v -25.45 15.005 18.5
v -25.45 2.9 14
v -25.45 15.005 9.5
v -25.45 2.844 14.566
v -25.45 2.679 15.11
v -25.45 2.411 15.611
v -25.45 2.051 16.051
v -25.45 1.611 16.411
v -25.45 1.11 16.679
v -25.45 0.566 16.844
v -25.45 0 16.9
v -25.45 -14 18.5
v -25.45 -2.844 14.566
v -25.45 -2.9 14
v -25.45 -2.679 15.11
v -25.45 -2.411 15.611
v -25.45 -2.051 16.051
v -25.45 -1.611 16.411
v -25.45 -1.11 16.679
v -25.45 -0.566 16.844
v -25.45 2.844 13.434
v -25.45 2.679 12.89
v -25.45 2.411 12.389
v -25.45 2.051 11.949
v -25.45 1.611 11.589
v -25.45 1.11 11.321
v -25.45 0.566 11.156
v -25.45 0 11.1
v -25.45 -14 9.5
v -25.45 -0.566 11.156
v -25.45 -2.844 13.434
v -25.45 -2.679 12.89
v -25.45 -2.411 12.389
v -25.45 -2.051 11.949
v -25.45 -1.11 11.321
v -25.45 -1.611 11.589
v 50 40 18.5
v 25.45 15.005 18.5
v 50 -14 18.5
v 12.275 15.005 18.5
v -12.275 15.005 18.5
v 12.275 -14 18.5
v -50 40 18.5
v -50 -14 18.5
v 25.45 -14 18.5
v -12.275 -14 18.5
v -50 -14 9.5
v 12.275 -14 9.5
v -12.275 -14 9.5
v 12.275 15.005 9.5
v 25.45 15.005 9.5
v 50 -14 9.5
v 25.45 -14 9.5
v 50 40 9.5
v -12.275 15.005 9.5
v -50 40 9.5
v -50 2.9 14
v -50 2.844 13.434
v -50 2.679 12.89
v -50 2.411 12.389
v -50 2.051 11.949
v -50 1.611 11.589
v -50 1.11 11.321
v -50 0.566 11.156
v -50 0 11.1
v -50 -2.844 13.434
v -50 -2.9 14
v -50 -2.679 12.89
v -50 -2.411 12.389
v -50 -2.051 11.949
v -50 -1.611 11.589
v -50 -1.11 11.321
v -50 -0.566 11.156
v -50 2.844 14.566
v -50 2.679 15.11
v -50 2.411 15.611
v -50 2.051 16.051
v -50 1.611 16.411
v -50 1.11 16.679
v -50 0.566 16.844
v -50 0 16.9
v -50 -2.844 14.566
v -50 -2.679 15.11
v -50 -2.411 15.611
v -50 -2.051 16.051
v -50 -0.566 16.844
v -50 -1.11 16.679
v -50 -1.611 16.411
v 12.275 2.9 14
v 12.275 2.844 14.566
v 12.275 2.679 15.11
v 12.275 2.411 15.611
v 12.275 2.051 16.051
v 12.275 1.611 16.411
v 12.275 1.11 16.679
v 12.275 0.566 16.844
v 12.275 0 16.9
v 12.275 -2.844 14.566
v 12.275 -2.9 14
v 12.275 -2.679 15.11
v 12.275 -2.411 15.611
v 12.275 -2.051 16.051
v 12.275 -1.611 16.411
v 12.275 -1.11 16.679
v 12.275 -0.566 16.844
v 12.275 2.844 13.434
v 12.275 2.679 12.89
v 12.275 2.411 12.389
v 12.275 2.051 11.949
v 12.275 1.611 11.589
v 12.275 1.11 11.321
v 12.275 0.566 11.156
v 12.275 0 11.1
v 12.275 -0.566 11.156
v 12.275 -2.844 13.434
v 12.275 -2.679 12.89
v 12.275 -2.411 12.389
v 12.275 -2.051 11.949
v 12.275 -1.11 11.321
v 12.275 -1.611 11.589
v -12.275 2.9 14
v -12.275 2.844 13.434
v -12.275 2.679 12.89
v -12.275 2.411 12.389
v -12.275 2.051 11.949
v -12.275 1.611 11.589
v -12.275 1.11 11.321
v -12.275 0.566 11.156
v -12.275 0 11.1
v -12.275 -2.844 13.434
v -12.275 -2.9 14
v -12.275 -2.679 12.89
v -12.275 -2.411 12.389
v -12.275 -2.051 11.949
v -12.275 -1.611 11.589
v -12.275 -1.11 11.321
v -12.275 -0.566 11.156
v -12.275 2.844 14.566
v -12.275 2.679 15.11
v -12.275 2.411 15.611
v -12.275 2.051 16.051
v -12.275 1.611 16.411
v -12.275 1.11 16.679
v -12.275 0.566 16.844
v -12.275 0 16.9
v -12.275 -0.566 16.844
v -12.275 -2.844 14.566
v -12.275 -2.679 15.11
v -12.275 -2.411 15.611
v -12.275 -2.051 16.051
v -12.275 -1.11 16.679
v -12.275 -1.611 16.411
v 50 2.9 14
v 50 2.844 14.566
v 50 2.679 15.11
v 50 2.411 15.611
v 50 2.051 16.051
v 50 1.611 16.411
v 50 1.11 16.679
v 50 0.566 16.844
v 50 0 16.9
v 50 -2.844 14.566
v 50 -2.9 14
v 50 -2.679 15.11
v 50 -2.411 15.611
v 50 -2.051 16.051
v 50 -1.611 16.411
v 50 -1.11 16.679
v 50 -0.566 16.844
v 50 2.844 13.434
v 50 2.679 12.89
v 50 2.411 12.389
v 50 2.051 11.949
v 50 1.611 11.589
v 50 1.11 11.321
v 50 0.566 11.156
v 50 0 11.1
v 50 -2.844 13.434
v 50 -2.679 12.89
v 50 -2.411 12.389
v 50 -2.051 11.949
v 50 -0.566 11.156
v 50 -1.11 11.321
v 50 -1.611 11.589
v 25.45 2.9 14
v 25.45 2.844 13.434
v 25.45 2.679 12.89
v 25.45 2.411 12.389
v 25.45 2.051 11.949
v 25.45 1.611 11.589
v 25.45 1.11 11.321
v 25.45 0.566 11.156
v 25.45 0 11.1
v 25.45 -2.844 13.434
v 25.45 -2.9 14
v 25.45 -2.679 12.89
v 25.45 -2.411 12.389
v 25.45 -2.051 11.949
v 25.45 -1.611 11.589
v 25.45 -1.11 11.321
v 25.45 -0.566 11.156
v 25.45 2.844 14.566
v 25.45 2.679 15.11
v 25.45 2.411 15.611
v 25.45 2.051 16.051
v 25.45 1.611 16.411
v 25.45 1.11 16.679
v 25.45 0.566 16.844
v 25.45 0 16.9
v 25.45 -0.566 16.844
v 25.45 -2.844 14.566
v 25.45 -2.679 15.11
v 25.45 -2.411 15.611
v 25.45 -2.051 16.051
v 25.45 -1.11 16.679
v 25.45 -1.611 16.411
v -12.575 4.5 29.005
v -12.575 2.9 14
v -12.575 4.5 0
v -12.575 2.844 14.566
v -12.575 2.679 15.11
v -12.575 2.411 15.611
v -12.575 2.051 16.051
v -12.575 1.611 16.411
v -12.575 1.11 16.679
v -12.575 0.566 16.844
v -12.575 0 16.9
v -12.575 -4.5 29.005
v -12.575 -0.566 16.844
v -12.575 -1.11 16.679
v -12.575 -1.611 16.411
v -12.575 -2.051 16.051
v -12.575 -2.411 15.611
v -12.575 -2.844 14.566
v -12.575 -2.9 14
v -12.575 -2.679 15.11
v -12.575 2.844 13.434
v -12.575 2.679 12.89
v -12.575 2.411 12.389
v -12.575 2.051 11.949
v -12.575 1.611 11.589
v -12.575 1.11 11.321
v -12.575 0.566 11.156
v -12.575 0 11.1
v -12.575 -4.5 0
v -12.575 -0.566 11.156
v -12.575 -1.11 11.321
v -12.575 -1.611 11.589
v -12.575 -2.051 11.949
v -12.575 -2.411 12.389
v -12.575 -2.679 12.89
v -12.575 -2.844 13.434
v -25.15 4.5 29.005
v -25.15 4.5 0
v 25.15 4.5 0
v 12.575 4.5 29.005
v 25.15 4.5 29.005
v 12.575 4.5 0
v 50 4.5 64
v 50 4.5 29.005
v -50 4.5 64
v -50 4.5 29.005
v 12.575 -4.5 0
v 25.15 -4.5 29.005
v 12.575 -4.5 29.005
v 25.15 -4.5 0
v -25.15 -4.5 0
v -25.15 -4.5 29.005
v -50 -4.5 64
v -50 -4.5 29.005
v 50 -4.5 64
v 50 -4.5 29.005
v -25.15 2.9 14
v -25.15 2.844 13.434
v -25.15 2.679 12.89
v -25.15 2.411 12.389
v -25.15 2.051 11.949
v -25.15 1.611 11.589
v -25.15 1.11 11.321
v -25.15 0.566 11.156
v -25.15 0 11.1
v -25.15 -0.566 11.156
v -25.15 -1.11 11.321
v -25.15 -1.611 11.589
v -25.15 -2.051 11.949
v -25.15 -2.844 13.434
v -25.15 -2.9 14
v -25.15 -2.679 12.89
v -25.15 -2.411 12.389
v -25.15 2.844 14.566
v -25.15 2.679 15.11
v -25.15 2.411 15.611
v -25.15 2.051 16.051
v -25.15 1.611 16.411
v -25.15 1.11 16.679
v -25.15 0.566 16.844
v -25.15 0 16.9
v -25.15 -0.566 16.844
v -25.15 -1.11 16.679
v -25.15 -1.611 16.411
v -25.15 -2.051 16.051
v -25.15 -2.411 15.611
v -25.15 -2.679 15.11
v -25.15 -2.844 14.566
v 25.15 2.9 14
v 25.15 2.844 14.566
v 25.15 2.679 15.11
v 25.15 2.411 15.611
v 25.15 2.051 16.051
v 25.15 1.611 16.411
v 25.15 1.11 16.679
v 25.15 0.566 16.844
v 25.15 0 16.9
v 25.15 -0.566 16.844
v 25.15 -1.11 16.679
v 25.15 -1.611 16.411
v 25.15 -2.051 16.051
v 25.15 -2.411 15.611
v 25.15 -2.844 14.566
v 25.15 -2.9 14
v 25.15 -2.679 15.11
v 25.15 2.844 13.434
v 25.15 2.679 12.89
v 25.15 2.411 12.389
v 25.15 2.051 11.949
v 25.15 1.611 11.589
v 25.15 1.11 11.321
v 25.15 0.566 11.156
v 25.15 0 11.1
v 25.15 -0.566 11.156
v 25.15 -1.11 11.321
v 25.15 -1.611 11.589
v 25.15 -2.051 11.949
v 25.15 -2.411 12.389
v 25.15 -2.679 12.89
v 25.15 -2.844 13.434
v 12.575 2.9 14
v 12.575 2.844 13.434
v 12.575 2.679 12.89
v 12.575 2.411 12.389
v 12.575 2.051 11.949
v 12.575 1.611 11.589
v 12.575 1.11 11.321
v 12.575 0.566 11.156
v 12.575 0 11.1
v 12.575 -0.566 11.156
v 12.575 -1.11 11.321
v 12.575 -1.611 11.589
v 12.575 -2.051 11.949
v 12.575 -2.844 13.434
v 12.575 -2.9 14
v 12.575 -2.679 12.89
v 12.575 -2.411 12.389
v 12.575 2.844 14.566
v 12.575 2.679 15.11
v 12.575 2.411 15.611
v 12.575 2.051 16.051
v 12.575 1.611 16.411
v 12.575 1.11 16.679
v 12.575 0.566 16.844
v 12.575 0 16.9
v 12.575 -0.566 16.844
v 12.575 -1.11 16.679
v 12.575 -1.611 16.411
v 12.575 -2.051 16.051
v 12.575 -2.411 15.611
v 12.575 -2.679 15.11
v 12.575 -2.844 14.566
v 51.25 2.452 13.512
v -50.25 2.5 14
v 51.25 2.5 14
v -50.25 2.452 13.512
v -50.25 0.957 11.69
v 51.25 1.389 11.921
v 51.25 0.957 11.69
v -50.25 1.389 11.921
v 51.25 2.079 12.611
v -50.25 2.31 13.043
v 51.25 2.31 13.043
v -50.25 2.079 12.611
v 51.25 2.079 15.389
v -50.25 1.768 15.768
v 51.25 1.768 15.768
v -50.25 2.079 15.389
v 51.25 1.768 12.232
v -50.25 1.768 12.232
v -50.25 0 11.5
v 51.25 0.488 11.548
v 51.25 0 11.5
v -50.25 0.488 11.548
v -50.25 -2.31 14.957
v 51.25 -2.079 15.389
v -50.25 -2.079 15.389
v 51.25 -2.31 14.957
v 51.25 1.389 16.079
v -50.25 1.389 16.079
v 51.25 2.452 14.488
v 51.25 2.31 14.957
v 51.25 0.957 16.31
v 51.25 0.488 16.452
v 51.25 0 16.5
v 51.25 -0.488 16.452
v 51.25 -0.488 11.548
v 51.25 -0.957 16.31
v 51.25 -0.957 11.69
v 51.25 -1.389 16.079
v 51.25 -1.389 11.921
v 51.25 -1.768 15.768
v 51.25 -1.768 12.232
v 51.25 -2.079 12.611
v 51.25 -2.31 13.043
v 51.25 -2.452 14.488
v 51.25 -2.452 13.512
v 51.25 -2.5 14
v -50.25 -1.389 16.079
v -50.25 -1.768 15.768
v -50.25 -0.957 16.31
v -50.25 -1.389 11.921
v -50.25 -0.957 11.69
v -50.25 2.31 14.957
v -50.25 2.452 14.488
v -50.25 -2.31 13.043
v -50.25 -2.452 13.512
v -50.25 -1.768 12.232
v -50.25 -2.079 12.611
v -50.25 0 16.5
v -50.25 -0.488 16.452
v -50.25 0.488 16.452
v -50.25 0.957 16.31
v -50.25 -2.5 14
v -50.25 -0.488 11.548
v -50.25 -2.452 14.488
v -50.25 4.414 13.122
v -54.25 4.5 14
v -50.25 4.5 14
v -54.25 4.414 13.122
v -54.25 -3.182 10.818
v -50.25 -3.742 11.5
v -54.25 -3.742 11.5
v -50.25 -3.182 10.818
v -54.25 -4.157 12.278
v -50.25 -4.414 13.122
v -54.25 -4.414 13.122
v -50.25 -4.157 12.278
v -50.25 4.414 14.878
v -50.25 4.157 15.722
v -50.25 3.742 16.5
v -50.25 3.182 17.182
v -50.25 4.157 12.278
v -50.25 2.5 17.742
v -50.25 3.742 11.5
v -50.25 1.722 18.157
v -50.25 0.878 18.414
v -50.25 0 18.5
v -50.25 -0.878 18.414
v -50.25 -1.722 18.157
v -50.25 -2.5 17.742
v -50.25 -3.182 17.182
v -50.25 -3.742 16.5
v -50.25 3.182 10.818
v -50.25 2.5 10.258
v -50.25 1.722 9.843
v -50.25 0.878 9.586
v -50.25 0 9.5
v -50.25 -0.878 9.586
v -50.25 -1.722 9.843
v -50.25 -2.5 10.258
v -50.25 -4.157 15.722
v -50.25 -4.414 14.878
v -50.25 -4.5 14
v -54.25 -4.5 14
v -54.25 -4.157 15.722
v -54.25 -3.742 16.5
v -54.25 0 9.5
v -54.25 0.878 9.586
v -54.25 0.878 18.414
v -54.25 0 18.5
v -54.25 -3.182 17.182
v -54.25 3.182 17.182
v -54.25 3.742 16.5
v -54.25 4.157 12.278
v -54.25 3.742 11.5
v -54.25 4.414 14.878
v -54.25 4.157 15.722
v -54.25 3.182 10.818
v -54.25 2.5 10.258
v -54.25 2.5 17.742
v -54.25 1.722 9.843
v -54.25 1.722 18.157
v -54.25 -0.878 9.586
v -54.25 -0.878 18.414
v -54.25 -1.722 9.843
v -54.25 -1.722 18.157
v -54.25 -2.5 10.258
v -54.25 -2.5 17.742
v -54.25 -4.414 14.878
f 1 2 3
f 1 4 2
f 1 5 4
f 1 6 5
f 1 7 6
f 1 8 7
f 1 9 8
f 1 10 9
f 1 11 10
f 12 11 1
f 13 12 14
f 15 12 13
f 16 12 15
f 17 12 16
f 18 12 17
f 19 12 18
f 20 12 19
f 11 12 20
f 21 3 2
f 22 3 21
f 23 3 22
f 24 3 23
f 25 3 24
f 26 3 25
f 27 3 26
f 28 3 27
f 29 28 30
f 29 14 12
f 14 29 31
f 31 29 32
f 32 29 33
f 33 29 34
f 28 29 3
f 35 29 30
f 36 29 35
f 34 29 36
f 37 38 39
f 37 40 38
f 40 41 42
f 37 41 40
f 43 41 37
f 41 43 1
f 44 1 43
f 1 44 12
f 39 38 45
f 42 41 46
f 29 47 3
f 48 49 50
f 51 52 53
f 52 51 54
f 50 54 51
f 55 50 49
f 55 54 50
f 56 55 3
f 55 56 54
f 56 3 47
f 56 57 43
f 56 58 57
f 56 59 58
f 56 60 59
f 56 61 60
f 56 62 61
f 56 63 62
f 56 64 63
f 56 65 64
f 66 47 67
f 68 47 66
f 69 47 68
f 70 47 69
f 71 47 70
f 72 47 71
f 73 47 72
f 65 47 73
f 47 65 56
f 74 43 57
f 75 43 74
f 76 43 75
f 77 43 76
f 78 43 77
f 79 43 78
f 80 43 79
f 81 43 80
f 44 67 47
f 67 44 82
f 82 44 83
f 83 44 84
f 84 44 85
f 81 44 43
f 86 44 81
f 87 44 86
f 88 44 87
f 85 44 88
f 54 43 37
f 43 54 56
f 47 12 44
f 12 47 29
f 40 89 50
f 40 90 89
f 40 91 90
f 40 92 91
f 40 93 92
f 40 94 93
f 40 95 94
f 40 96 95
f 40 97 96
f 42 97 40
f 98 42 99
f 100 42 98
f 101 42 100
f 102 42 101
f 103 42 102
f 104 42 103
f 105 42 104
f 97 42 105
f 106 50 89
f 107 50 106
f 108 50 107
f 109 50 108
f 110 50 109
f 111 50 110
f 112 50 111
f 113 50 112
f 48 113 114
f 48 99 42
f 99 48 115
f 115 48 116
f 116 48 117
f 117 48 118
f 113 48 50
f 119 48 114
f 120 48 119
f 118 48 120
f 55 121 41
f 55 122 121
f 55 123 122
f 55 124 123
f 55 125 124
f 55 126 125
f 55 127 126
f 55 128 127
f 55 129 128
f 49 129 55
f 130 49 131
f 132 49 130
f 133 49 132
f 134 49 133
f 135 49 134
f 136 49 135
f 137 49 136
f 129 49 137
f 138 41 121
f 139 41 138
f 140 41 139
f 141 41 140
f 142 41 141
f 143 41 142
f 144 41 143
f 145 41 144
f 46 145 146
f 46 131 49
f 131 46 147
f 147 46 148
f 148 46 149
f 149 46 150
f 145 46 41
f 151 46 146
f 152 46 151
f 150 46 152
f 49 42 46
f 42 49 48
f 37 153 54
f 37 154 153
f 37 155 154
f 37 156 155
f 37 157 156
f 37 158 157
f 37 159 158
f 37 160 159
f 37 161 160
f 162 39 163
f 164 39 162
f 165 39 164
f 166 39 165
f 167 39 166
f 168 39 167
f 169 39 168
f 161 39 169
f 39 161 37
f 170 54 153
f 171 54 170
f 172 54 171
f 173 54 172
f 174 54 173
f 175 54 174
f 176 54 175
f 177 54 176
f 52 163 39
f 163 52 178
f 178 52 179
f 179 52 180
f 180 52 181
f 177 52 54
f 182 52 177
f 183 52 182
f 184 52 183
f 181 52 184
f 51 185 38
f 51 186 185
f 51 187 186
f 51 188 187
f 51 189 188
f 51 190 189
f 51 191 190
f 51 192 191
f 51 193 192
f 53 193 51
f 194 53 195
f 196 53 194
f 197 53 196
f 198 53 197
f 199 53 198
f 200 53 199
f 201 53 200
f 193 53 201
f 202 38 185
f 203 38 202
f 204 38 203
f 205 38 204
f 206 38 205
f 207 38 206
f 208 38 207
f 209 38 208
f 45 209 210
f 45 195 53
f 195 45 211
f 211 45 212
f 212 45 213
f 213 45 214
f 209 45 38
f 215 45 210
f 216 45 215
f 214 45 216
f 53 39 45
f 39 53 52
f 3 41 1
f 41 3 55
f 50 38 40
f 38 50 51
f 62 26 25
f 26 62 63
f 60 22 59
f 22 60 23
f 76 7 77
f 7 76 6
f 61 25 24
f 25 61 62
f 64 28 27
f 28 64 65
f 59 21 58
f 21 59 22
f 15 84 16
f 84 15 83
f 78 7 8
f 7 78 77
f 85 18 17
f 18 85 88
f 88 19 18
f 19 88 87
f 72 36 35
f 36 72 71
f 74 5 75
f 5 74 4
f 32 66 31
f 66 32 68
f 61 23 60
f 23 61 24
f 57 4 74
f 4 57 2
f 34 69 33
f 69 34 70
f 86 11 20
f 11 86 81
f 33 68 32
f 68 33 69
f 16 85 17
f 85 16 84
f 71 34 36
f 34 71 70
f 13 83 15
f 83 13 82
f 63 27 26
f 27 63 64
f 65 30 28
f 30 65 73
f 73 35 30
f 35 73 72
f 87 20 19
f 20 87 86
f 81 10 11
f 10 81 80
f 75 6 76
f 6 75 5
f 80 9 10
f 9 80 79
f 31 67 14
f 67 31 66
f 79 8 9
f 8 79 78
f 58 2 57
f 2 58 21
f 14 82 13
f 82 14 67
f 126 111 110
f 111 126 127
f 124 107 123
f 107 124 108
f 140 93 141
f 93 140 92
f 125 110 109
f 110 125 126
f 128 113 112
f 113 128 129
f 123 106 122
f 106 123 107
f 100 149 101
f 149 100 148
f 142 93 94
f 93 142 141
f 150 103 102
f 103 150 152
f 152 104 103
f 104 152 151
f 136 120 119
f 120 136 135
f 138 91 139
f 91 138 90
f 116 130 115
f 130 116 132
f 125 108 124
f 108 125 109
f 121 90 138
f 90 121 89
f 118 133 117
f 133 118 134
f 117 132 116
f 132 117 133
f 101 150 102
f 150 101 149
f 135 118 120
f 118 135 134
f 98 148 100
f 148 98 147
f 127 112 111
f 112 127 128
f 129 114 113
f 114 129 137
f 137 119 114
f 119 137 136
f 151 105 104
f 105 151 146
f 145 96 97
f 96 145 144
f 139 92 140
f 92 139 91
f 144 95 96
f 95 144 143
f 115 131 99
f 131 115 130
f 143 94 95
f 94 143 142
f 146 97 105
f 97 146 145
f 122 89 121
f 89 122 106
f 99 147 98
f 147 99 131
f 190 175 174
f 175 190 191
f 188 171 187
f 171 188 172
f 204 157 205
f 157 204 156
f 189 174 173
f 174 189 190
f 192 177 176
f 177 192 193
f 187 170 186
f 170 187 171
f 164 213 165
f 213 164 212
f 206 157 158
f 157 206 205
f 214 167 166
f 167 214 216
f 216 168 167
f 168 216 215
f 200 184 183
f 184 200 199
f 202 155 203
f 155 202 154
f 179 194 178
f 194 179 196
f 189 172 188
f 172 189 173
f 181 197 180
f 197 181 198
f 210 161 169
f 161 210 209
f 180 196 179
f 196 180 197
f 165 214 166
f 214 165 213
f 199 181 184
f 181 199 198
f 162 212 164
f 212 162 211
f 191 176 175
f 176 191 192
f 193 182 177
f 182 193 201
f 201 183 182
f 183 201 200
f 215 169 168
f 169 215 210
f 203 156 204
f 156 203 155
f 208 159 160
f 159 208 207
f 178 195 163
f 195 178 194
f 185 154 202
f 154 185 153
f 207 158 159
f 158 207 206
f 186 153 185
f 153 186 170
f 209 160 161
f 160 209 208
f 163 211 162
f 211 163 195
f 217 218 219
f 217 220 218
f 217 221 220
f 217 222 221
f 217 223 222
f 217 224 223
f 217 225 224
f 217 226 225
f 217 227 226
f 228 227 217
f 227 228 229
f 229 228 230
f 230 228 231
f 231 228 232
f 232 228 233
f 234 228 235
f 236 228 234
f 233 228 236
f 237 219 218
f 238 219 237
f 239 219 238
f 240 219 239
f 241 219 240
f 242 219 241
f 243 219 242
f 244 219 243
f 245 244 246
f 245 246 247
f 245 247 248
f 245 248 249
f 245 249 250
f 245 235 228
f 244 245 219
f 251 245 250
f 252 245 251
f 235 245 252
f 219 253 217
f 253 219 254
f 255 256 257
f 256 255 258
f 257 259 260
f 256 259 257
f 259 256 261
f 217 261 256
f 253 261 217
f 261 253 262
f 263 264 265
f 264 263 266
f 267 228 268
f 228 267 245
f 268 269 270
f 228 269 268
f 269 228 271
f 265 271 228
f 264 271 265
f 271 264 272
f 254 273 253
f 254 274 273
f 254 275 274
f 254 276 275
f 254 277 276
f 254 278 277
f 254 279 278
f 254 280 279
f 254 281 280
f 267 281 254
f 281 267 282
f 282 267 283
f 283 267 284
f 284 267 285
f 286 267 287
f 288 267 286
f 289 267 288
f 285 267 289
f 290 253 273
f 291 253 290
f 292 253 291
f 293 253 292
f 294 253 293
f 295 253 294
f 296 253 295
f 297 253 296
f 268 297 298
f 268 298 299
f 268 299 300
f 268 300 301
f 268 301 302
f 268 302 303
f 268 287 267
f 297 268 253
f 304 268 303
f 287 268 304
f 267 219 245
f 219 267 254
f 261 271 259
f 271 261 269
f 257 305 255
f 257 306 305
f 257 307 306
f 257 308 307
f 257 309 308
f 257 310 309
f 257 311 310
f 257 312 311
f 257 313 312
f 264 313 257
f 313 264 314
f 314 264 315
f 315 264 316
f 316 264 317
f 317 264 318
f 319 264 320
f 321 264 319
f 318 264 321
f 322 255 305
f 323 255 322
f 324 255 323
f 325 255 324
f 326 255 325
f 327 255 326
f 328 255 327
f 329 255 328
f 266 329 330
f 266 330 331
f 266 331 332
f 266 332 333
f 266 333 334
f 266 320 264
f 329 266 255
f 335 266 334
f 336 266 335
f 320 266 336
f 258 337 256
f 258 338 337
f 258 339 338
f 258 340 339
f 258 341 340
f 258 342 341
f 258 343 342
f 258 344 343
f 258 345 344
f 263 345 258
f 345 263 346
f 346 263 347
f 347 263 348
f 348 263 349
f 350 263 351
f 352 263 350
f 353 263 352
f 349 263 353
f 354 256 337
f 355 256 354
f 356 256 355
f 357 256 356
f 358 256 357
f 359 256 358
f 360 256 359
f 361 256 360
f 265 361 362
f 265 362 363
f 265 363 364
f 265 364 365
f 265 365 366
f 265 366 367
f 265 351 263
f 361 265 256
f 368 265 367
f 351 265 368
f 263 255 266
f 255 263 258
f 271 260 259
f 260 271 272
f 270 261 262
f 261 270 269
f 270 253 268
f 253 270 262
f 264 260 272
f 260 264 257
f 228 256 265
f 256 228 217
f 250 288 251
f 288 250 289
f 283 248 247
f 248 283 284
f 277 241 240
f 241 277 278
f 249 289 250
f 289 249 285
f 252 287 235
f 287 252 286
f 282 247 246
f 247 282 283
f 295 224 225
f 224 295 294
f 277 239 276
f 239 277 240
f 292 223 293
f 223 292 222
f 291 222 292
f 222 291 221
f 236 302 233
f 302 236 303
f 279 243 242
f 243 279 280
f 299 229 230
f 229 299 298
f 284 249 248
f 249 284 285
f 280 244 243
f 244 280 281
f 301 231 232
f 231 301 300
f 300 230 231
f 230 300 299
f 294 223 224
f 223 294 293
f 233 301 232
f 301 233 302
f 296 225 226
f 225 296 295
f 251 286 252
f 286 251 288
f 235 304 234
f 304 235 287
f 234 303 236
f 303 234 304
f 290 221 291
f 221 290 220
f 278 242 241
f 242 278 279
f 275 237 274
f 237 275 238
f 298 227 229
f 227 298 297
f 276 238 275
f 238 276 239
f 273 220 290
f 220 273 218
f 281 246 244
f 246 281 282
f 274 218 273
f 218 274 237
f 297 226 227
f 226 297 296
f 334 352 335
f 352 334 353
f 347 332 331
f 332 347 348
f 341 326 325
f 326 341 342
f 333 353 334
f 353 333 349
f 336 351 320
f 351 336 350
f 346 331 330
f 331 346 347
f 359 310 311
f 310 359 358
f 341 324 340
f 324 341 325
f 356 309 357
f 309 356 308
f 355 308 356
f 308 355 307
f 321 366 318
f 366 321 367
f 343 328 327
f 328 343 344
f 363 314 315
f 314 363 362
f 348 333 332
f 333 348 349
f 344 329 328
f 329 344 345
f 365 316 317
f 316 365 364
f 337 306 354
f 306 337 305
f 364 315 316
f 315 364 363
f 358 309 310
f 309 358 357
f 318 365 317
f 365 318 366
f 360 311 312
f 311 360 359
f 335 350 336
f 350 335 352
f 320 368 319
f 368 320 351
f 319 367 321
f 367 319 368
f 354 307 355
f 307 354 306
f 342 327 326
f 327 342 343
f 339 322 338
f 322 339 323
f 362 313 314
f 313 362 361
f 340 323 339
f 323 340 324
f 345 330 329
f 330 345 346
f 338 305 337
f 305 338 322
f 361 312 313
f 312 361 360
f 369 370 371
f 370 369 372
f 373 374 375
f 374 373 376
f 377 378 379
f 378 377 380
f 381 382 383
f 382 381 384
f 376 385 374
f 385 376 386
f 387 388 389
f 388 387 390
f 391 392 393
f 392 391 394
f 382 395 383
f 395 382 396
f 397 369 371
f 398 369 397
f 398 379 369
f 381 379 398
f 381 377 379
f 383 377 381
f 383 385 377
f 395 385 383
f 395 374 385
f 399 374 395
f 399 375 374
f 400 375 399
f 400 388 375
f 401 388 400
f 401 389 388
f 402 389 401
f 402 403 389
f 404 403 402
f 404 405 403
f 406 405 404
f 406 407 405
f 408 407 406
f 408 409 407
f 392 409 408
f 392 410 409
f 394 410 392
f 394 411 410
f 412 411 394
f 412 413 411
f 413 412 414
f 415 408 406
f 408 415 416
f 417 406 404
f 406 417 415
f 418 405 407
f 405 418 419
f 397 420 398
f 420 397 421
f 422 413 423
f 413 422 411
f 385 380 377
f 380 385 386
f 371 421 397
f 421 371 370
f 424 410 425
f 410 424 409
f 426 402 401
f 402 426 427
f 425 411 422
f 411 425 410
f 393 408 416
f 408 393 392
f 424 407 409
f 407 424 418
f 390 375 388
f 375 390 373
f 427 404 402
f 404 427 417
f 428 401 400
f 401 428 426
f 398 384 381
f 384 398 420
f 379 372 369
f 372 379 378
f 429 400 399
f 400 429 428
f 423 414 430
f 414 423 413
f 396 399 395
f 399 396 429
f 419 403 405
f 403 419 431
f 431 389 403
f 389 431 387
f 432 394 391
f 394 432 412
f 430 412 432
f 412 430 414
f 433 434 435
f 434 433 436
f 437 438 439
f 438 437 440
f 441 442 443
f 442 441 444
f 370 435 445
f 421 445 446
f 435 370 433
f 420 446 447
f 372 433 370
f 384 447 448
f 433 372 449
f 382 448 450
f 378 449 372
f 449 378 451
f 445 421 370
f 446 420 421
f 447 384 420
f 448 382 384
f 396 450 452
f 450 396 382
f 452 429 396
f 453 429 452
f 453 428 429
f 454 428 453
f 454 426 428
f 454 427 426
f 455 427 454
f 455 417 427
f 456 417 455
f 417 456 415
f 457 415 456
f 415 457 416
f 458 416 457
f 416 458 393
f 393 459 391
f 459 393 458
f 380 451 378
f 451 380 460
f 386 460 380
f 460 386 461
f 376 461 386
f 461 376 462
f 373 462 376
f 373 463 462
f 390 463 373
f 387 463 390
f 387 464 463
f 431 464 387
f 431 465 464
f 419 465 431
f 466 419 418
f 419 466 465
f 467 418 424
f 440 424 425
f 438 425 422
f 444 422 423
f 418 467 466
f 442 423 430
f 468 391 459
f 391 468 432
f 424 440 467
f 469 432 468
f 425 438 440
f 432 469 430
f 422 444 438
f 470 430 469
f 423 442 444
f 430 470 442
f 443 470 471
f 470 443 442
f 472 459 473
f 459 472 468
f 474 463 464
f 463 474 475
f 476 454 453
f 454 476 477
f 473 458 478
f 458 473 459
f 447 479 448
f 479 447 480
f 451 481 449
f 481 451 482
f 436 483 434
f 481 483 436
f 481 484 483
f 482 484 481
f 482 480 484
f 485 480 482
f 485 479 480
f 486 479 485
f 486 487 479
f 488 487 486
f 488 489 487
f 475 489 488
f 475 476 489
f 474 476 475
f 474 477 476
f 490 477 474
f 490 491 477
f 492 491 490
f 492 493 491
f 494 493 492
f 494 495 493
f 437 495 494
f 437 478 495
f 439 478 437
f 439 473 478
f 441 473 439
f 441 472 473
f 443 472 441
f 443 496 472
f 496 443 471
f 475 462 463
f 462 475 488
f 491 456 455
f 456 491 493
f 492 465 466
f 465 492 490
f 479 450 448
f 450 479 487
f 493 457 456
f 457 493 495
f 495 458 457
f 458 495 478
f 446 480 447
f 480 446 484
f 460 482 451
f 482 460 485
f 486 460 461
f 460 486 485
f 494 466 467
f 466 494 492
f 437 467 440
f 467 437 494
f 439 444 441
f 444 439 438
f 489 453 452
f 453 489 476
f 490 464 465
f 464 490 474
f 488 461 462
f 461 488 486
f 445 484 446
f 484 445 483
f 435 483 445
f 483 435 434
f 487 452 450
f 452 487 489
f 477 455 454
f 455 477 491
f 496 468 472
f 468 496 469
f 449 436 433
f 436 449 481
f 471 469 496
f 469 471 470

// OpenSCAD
$fn = 32;

// ------------------------------------------------------------------------
// Butt hinge: hinge 100 mm, leaf swung 270 deg
// Every part is its own module, assembly() places every instance.
// ------------------------------------------------------------------------

// --- part 1 ---
module hinge_base() {
  difference() {
    union() {
      translate([-50, -14, -4.5]) cube([24.55, 54, 9]);
      translate([-12.275, -14, -4.5]) cube([24.55, 54, 9]);
      translate([25.45, -14, -4.5]) cube([24.55, 54, 9]);
      translate([-50, 15.005, -4.5]) cube([100, 24.995, 9]);
    }
    translate([-37.725, 0, 0]) rotate([0, 90, 0]) cylinder(h = 26.55, d = 5.8, center = true);
    translate([0, 0, 0]) rotate([0, 90, 0]) cylinder(h = 26.55, d = 5.8, center = true);
    translate([37.725, 0, 0]) rotate([0, 90, 0]) cylinder(h = 26.55, d = 5.8, center = true);
  }
}

// --- part 2 ---
module hinge_mover() {
  difference() {
    union() {
      translate([-25.15, -50, -4.5]) cube([12.575, 64, 9]);
      translate([12.575, -50, -4.5]) cube([12.575, 64, 9]);
      translate([-50, -50, -4.5]) cube([100, 34.995, 9]);
    }
    translate([-18.863, 0, 0]) rotate([0, 90, 0]) cylinder(h = 14.575, d = 5.8, center = true);
    translate([18.863, 0, 0]) rotate([0, 90, 0]) cylinder(h = 14.575, d = 5.8, center = true);
  }
}

// --- part 3 ---
module hinge_pin() {
  rotate([0, 90, 0]) cylinder(h = 102.5, d = 5, center = true);
  translate([-54.25, 0, 0]) rotate([0, 90, 0]) cylinder(h = 4, d = 9);
}

// --- assembly ---
module assembly() {
  color([0.80, 0.24, 0.20]) translate([0, 0, 14]) rotate([0, 0, 0]) hinge_base();
  color([0.20, 0.45, 0.75]) translate([0, 0, 14]) rotate([270, 0, 0]) hinge_mover();
  color([0.25, 0.62, 0.32]) translate([0, 0, 14]) rotate([0, 0, 0]) hinge_pin();
}

assembly();
